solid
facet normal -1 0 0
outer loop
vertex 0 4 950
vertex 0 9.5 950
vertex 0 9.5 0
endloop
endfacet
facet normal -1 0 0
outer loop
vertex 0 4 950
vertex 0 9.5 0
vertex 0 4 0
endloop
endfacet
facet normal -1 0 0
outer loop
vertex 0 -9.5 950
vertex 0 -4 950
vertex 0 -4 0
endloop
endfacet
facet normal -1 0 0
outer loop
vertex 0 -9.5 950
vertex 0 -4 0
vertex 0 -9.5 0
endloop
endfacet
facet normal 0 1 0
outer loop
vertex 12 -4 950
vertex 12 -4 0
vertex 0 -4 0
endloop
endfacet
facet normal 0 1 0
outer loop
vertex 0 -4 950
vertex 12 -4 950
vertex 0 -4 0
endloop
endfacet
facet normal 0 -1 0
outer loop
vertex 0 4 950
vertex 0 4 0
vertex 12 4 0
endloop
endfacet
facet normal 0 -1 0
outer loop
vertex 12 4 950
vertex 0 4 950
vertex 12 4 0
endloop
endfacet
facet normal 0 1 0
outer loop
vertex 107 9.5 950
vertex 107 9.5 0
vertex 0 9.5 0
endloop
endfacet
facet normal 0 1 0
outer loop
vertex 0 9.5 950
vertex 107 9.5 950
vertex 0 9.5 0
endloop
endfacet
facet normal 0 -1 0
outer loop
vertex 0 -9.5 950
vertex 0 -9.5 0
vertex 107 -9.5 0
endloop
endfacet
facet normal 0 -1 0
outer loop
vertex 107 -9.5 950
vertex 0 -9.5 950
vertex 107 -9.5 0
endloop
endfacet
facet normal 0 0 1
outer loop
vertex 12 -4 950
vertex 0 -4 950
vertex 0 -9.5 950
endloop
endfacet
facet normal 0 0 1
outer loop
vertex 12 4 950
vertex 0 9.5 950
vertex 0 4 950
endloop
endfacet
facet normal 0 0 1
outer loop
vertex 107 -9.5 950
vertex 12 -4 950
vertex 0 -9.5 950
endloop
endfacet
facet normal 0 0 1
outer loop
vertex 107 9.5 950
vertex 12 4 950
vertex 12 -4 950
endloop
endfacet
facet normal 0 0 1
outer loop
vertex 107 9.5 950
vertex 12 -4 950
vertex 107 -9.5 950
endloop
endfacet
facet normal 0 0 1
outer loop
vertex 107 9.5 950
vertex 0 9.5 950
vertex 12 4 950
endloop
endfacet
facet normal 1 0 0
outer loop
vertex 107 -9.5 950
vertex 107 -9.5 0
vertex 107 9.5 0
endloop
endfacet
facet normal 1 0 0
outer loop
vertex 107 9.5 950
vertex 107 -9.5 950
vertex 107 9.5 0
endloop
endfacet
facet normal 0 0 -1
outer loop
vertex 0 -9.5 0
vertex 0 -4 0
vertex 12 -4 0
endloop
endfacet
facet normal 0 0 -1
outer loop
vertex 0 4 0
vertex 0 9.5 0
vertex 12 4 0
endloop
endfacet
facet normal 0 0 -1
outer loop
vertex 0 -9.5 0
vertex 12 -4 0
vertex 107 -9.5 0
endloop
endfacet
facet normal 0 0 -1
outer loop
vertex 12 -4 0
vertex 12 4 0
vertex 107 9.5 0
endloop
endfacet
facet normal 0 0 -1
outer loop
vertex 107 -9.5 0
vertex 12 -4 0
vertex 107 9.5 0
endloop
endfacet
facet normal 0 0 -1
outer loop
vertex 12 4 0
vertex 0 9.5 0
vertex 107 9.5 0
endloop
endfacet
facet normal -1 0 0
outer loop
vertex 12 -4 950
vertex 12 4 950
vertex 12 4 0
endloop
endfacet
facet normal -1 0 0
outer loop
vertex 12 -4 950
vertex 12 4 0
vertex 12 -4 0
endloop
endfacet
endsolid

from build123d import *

# Parameters (mm, degrees)
F1_DEPTH = 950
F3_DEPTH = 950.001


with BuildPart() as f1:
    # F0 (on Top) → F1 (new body)
    with BuildSketch(Plane.XY):
        Polygon((0, -4), (0, -9.5), (136, -9.5), (136, -4), (146, -4), (146, 4), (116, 4), (110.5, 9.5), (0, 9.5), (0, 4), (12, 4), (12, -4), align=None)
    extrude(amount=F1_DEPTH)

    # F2 (on face) → F3 (cut, through all)
    with BuildSketch(Plane(origin=(0, 0, 0), x_dir=(1, 0, 0), z_dir=(0, 0, -1))):
        Polygon((107, 9.5), (107, -9.5), (110.5, -9.5), (116, -4), (146, -4), (146, 4), (136, 4), (136, 9.5), align=None)
    extrude(amount=-F3_DEPTH, mode=Mode.SUBTRACT)


solid = f1.part
